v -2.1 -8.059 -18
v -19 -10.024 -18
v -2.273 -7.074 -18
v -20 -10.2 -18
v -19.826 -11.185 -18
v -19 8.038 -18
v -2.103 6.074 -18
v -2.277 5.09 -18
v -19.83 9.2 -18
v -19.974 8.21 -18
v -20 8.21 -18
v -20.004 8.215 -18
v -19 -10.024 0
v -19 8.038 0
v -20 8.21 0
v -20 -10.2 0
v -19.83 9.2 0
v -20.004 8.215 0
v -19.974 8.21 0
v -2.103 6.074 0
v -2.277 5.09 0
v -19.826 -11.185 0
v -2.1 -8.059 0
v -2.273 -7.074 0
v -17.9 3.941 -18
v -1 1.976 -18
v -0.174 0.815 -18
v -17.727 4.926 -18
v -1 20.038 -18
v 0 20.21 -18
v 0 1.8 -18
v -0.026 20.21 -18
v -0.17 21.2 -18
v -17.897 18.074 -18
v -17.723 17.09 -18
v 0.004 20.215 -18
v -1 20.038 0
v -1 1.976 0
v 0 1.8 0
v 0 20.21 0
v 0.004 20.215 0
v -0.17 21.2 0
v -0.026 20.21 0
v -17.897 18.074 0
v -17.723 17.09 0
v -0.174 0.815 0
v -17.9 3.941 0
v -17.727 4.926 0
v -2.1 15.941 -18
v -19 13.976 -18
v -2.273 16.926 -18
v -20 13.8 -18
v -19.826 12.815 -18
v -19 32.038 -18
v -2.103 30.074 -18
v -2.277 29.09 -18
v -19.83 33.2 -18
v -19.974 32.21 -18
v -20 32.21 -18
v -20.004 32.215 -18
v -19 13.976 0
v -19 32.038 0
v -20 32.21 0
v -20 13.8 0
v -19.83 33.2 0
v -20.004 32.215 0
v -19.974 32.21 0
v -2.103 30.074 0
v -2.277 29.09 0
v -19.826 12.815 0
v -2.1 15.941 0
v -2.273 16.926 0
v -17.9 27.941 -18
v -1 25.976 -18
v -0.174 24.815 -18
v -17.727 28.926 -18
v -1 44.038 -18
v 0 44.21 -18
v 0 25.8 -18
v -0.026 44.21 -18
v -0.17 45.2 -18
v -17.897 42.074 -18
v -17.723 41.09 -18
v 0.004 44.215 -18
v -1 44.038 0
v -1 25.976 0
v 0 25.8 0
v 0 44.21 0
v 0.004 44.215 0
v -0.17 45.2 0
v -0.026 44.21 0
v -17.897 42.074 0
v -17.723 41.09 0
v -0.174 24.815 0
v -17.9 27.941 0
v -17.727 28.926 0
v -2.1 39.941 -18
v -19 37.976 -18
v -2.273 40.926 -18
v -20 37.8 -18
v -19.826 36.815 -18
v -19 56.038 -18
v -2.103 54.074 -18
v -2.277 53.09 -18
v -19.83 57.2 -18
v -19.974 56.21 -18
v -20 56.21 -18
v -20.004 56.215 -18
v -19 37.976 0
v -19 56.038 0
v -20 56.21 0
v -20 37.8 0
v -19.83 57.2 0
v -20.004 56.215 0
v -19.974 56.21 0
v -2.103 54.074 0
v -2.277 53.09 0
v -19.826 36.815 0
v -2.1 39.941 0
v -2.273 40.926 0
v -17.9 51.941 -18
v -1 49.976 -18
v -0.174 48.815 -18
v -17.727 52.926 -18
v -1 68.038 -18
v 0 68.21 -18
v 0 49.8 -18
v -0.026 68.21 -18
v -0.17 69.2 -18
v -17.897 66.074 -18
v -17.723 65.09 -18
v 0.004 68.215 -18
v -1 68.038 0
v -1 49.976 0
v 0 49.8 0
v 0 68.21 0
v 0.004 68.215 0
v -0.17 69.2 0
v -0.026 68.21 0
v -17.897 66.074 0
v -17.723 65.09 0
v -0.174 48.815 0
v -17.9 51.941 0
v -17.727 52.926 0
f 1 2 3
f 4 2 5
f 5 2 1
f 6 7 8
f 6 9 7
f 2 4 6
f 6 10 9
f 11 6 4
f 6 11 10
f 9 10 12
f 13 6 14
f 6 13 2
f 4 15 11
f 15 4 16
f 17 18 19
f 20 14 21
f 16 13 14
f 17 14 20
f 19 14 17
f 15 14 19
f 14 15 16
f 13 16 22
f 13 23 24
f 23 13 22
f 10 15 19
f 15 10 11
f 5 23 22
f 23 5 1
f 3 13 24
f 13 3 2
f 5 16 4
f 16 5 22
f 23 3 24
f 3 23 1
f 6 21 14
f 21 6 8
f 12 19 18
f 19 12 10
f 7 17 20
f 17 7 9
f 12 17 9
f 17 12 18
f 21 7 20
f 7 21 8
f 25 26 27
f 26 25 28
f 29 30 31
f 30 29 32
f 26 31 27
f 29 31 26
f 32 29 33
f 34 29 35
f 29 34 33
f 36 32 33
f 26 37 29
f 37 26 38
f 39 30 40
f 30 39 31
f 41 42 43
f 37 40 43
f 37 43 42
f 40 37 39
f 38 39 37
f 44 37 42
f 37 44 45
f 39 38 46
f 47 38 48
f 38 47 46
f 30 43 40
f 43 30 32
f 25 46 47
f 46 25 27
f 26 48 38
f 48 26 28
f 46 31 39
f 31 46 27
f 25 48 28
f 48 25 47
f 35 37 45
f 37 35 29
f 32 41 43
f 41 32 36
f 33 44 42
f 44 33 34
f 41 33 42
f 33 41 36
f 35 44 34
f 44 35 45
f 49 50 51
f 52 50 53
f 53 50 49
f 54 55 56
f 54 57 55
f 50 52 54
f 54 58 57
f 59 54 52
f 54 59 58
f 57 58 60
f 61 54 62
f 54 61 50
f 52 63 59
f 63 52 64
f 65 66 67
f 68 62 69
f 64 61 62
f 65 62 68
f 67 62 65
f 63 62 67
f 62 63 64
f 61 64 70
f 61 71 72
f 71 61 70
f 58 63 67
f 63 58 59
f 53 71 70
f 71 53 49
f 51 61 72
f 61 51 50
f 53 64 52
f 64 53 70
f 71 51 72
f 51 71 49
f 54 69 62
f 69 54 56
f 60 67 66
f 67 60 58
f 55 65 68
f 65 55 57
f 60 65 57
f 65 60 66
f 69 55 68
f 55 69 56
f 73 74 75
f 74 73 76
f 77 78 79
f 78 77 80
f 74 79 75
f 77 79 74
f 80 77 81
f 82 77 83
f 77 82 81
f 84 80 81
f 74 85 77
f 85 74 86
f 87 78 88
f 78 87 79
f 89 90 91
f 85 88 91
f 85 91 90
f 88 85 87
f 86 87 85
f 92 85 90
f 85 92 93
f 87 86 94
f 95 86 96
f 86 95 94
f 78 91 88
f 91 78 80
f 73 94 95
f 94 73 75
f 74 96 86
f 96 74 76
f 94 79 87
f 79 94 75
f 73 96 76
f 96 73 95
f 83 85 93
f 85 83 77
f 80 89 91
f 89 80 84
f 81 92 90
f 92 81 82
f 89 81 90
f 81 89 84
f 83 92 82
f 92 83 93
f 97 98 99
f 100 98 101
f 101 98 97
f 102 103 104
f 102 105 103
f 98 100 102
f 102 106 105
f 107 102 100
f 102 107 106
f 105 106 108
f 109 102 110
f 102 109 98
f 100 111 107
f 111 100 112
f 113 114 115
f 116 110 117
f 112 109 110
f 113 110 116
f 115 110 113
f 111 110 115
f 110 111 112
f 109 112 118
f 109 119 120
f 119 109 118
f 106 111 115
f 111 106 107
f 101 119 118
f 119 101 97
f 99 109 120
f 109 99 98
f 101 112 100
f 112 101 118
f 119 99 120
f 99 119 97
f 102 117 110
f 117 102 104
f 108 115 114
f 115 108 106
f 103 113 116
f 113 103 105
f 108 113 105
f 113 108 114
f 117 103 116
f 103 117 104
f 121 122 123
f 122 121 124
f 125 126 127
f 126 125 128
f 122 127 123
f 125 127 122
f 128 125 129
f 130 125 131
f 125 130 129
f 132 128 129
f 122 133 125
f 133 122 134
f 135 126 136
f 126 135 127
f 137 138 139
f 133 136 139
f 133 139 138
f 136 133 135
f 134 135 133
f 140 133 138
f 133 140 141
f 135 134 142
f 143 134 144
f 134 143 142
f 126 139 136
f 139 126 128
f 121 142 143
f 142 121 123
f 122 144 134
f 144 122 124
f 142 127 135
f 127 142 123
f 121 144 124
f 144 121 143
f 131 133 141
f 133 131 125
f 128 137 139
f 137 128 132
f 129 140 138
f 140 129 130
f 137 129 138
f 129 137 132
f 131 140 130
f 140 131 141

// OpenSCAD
module clip(mi){
    mirror([mi,0,0])
    rotate([0,90,0])
    union(){
    translate([0,-.2,0])
    cube([18,18.41,1]);

    translate([0,-.2,0])
    rotate([80,0,0])
    cube([18,18,1]);

    translate([0,19.2,.17])
    rotate([100,0,0])
    cube([18,18,1]);
    }
}

for(i = [0:5]){
    
    if(i%2 == 0){
        translate([-20,i * 12 - 10 ,0])
    clip(i%2);   
    }else{
        translate([0,i * 12 - 10,0])
    
    clip(i%2);      
    } 
}
